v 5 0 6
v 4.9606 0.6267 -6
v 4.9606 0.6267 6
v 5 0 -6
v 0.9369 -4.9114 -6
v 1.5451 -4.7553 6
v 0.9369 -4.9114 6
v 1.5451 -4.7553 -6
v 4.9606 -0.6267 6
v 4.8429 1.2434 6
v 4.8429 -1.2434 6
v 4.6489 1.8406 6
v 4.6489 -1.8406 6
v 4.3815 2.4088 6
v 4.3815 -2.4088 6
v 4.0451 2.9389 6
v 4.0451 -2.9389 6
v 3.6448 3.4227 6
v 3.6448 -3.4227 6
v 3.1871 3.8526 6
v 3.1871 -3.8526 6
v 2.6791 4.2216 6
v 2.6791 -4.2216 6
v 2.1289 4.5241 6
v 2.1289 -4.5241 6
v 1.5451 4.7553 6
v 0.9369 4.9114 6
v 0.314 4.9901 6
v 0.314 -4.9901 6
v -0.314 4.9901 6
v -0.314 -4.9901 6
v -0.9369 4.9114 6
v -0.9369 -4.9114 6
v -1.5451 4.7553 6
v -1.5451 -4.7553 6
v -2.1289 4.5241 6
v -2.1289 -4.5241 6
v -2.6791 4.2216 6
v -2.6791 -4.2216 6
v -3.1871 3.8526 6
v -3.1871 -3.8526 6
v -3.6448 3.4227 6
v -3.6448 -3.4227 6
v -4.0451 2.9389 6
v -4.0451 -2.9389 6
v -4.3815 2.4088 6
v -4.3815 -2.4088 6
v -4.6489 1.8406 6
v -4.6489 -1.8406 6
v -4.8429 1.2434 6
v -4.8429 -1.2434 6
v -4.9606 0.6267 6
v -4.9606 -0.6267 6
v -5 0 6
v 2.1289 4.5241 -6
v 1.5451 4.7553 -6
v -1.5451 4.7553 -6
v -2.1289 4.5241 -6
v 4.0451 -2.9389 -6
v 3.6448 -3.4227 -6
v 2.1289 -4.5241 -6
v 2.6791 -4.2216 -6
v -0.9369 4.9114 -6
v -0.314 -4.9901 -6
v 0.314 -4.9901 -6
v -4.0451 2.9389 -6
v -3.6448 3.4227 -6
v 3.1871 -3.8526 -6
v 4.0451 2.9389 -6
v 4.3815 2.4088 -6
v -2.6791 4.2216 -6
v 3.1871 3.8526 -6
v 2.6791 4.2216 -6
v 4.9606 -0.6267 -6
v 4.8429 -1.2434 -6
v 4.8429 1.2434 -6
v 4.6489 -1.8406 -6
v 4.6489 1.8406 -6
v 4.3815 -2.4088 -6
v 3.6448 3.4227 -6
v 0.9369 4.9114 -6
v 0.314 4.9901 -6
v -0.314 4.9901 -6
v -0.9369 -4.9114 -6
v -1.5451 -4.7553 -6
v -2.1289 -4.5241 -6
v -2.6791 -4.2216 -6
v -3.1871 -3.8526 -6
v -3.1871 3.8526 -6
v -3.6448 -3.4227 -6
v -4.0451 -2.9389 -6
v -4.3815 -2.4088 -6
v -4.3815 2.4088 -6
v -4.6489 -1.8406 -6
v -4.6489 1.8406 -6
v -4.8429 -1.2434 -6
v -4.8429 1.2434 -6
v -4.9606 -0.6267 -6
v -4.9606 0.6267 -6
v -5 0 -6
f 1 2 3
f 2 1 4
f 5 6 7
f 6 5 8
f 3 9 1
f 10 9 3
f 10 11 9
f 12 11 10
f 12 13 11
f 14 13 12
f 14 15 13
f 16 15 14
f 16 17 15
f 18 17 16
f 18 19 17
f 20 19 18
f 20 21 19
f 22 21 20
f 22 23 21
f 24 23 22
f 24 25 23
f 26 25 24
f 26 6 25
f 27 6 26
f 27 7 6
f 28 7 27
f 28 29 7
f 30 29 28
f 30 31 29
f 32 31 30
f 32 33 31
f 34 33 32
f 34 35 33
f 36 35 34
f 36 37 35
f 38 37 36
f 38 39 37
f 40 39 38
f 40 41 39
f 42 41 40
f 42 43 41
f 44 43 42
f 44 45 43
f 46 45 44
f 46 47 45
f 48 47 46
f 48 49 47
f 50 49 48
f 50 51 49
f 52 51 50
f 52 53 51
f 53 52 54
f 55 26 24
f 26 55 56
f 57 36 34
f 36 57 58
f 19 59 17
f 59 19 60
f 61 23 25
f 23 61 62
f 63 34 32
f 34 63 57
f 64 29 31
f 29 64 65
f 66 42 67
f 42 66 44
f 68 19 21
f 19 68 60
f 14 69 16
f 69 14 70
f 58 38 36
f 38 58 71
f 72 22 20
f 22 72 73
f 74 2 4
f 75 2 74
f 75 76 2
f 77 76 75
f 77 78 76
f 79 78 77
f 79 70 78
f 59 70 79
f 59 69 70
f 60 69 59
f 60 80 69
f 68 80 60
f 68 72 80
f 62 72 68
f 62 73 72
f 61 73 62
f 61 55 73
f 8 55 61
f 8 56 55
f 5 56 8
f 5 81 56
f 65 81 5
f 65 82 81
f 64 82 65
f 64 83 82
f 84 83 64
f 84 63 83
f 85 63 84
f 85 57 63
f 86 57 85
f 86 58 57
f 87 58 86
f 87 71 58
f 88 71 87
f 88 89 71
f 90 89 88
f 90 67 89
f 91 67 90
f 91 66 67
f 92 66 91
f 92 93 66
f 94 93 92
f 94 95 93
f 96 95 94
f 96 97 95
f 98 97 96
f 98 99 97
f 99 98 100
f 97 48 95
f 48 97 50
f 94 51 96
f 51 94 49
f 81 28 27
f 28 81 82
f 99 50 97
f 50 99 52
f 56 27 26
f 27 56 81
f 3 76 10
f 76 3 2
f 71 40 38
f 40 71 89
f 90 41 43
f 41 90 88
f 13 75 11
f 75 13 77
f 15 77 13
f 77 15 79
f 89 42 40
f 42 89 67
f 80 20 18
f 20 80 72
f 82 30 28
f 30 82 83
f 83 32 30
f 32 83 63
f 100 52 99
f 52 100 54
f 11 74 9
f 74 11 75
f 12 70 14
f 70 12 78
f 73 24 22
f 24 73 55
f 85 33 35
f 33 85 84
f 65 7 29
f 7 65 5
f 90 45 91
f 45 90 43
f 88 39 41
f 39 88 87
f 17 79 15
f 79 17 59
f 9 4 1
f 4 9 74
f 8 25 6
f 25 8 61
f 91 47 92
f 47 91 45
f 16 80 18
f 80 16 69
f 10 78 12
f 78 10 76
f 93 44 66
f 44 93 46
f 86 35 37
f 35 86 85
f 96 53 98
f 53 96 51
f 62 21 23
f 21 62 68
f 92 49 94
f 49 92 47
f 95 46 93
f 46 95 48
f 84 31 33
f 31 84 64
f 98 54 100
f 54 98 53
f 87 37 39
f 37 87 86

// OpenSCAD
$fn = 50;

difference() {
	union() {
		translate(v = [0, 0, 0]) {
			rotate(a = [0, 0, 0]) {
				difference() {
					union() {
						translate(v = [0, 0, -6.0]) {
							cylinder(h = 12, r = 5);
						}
					}
					union();
				}
			}
		}
	}
	union();
}
